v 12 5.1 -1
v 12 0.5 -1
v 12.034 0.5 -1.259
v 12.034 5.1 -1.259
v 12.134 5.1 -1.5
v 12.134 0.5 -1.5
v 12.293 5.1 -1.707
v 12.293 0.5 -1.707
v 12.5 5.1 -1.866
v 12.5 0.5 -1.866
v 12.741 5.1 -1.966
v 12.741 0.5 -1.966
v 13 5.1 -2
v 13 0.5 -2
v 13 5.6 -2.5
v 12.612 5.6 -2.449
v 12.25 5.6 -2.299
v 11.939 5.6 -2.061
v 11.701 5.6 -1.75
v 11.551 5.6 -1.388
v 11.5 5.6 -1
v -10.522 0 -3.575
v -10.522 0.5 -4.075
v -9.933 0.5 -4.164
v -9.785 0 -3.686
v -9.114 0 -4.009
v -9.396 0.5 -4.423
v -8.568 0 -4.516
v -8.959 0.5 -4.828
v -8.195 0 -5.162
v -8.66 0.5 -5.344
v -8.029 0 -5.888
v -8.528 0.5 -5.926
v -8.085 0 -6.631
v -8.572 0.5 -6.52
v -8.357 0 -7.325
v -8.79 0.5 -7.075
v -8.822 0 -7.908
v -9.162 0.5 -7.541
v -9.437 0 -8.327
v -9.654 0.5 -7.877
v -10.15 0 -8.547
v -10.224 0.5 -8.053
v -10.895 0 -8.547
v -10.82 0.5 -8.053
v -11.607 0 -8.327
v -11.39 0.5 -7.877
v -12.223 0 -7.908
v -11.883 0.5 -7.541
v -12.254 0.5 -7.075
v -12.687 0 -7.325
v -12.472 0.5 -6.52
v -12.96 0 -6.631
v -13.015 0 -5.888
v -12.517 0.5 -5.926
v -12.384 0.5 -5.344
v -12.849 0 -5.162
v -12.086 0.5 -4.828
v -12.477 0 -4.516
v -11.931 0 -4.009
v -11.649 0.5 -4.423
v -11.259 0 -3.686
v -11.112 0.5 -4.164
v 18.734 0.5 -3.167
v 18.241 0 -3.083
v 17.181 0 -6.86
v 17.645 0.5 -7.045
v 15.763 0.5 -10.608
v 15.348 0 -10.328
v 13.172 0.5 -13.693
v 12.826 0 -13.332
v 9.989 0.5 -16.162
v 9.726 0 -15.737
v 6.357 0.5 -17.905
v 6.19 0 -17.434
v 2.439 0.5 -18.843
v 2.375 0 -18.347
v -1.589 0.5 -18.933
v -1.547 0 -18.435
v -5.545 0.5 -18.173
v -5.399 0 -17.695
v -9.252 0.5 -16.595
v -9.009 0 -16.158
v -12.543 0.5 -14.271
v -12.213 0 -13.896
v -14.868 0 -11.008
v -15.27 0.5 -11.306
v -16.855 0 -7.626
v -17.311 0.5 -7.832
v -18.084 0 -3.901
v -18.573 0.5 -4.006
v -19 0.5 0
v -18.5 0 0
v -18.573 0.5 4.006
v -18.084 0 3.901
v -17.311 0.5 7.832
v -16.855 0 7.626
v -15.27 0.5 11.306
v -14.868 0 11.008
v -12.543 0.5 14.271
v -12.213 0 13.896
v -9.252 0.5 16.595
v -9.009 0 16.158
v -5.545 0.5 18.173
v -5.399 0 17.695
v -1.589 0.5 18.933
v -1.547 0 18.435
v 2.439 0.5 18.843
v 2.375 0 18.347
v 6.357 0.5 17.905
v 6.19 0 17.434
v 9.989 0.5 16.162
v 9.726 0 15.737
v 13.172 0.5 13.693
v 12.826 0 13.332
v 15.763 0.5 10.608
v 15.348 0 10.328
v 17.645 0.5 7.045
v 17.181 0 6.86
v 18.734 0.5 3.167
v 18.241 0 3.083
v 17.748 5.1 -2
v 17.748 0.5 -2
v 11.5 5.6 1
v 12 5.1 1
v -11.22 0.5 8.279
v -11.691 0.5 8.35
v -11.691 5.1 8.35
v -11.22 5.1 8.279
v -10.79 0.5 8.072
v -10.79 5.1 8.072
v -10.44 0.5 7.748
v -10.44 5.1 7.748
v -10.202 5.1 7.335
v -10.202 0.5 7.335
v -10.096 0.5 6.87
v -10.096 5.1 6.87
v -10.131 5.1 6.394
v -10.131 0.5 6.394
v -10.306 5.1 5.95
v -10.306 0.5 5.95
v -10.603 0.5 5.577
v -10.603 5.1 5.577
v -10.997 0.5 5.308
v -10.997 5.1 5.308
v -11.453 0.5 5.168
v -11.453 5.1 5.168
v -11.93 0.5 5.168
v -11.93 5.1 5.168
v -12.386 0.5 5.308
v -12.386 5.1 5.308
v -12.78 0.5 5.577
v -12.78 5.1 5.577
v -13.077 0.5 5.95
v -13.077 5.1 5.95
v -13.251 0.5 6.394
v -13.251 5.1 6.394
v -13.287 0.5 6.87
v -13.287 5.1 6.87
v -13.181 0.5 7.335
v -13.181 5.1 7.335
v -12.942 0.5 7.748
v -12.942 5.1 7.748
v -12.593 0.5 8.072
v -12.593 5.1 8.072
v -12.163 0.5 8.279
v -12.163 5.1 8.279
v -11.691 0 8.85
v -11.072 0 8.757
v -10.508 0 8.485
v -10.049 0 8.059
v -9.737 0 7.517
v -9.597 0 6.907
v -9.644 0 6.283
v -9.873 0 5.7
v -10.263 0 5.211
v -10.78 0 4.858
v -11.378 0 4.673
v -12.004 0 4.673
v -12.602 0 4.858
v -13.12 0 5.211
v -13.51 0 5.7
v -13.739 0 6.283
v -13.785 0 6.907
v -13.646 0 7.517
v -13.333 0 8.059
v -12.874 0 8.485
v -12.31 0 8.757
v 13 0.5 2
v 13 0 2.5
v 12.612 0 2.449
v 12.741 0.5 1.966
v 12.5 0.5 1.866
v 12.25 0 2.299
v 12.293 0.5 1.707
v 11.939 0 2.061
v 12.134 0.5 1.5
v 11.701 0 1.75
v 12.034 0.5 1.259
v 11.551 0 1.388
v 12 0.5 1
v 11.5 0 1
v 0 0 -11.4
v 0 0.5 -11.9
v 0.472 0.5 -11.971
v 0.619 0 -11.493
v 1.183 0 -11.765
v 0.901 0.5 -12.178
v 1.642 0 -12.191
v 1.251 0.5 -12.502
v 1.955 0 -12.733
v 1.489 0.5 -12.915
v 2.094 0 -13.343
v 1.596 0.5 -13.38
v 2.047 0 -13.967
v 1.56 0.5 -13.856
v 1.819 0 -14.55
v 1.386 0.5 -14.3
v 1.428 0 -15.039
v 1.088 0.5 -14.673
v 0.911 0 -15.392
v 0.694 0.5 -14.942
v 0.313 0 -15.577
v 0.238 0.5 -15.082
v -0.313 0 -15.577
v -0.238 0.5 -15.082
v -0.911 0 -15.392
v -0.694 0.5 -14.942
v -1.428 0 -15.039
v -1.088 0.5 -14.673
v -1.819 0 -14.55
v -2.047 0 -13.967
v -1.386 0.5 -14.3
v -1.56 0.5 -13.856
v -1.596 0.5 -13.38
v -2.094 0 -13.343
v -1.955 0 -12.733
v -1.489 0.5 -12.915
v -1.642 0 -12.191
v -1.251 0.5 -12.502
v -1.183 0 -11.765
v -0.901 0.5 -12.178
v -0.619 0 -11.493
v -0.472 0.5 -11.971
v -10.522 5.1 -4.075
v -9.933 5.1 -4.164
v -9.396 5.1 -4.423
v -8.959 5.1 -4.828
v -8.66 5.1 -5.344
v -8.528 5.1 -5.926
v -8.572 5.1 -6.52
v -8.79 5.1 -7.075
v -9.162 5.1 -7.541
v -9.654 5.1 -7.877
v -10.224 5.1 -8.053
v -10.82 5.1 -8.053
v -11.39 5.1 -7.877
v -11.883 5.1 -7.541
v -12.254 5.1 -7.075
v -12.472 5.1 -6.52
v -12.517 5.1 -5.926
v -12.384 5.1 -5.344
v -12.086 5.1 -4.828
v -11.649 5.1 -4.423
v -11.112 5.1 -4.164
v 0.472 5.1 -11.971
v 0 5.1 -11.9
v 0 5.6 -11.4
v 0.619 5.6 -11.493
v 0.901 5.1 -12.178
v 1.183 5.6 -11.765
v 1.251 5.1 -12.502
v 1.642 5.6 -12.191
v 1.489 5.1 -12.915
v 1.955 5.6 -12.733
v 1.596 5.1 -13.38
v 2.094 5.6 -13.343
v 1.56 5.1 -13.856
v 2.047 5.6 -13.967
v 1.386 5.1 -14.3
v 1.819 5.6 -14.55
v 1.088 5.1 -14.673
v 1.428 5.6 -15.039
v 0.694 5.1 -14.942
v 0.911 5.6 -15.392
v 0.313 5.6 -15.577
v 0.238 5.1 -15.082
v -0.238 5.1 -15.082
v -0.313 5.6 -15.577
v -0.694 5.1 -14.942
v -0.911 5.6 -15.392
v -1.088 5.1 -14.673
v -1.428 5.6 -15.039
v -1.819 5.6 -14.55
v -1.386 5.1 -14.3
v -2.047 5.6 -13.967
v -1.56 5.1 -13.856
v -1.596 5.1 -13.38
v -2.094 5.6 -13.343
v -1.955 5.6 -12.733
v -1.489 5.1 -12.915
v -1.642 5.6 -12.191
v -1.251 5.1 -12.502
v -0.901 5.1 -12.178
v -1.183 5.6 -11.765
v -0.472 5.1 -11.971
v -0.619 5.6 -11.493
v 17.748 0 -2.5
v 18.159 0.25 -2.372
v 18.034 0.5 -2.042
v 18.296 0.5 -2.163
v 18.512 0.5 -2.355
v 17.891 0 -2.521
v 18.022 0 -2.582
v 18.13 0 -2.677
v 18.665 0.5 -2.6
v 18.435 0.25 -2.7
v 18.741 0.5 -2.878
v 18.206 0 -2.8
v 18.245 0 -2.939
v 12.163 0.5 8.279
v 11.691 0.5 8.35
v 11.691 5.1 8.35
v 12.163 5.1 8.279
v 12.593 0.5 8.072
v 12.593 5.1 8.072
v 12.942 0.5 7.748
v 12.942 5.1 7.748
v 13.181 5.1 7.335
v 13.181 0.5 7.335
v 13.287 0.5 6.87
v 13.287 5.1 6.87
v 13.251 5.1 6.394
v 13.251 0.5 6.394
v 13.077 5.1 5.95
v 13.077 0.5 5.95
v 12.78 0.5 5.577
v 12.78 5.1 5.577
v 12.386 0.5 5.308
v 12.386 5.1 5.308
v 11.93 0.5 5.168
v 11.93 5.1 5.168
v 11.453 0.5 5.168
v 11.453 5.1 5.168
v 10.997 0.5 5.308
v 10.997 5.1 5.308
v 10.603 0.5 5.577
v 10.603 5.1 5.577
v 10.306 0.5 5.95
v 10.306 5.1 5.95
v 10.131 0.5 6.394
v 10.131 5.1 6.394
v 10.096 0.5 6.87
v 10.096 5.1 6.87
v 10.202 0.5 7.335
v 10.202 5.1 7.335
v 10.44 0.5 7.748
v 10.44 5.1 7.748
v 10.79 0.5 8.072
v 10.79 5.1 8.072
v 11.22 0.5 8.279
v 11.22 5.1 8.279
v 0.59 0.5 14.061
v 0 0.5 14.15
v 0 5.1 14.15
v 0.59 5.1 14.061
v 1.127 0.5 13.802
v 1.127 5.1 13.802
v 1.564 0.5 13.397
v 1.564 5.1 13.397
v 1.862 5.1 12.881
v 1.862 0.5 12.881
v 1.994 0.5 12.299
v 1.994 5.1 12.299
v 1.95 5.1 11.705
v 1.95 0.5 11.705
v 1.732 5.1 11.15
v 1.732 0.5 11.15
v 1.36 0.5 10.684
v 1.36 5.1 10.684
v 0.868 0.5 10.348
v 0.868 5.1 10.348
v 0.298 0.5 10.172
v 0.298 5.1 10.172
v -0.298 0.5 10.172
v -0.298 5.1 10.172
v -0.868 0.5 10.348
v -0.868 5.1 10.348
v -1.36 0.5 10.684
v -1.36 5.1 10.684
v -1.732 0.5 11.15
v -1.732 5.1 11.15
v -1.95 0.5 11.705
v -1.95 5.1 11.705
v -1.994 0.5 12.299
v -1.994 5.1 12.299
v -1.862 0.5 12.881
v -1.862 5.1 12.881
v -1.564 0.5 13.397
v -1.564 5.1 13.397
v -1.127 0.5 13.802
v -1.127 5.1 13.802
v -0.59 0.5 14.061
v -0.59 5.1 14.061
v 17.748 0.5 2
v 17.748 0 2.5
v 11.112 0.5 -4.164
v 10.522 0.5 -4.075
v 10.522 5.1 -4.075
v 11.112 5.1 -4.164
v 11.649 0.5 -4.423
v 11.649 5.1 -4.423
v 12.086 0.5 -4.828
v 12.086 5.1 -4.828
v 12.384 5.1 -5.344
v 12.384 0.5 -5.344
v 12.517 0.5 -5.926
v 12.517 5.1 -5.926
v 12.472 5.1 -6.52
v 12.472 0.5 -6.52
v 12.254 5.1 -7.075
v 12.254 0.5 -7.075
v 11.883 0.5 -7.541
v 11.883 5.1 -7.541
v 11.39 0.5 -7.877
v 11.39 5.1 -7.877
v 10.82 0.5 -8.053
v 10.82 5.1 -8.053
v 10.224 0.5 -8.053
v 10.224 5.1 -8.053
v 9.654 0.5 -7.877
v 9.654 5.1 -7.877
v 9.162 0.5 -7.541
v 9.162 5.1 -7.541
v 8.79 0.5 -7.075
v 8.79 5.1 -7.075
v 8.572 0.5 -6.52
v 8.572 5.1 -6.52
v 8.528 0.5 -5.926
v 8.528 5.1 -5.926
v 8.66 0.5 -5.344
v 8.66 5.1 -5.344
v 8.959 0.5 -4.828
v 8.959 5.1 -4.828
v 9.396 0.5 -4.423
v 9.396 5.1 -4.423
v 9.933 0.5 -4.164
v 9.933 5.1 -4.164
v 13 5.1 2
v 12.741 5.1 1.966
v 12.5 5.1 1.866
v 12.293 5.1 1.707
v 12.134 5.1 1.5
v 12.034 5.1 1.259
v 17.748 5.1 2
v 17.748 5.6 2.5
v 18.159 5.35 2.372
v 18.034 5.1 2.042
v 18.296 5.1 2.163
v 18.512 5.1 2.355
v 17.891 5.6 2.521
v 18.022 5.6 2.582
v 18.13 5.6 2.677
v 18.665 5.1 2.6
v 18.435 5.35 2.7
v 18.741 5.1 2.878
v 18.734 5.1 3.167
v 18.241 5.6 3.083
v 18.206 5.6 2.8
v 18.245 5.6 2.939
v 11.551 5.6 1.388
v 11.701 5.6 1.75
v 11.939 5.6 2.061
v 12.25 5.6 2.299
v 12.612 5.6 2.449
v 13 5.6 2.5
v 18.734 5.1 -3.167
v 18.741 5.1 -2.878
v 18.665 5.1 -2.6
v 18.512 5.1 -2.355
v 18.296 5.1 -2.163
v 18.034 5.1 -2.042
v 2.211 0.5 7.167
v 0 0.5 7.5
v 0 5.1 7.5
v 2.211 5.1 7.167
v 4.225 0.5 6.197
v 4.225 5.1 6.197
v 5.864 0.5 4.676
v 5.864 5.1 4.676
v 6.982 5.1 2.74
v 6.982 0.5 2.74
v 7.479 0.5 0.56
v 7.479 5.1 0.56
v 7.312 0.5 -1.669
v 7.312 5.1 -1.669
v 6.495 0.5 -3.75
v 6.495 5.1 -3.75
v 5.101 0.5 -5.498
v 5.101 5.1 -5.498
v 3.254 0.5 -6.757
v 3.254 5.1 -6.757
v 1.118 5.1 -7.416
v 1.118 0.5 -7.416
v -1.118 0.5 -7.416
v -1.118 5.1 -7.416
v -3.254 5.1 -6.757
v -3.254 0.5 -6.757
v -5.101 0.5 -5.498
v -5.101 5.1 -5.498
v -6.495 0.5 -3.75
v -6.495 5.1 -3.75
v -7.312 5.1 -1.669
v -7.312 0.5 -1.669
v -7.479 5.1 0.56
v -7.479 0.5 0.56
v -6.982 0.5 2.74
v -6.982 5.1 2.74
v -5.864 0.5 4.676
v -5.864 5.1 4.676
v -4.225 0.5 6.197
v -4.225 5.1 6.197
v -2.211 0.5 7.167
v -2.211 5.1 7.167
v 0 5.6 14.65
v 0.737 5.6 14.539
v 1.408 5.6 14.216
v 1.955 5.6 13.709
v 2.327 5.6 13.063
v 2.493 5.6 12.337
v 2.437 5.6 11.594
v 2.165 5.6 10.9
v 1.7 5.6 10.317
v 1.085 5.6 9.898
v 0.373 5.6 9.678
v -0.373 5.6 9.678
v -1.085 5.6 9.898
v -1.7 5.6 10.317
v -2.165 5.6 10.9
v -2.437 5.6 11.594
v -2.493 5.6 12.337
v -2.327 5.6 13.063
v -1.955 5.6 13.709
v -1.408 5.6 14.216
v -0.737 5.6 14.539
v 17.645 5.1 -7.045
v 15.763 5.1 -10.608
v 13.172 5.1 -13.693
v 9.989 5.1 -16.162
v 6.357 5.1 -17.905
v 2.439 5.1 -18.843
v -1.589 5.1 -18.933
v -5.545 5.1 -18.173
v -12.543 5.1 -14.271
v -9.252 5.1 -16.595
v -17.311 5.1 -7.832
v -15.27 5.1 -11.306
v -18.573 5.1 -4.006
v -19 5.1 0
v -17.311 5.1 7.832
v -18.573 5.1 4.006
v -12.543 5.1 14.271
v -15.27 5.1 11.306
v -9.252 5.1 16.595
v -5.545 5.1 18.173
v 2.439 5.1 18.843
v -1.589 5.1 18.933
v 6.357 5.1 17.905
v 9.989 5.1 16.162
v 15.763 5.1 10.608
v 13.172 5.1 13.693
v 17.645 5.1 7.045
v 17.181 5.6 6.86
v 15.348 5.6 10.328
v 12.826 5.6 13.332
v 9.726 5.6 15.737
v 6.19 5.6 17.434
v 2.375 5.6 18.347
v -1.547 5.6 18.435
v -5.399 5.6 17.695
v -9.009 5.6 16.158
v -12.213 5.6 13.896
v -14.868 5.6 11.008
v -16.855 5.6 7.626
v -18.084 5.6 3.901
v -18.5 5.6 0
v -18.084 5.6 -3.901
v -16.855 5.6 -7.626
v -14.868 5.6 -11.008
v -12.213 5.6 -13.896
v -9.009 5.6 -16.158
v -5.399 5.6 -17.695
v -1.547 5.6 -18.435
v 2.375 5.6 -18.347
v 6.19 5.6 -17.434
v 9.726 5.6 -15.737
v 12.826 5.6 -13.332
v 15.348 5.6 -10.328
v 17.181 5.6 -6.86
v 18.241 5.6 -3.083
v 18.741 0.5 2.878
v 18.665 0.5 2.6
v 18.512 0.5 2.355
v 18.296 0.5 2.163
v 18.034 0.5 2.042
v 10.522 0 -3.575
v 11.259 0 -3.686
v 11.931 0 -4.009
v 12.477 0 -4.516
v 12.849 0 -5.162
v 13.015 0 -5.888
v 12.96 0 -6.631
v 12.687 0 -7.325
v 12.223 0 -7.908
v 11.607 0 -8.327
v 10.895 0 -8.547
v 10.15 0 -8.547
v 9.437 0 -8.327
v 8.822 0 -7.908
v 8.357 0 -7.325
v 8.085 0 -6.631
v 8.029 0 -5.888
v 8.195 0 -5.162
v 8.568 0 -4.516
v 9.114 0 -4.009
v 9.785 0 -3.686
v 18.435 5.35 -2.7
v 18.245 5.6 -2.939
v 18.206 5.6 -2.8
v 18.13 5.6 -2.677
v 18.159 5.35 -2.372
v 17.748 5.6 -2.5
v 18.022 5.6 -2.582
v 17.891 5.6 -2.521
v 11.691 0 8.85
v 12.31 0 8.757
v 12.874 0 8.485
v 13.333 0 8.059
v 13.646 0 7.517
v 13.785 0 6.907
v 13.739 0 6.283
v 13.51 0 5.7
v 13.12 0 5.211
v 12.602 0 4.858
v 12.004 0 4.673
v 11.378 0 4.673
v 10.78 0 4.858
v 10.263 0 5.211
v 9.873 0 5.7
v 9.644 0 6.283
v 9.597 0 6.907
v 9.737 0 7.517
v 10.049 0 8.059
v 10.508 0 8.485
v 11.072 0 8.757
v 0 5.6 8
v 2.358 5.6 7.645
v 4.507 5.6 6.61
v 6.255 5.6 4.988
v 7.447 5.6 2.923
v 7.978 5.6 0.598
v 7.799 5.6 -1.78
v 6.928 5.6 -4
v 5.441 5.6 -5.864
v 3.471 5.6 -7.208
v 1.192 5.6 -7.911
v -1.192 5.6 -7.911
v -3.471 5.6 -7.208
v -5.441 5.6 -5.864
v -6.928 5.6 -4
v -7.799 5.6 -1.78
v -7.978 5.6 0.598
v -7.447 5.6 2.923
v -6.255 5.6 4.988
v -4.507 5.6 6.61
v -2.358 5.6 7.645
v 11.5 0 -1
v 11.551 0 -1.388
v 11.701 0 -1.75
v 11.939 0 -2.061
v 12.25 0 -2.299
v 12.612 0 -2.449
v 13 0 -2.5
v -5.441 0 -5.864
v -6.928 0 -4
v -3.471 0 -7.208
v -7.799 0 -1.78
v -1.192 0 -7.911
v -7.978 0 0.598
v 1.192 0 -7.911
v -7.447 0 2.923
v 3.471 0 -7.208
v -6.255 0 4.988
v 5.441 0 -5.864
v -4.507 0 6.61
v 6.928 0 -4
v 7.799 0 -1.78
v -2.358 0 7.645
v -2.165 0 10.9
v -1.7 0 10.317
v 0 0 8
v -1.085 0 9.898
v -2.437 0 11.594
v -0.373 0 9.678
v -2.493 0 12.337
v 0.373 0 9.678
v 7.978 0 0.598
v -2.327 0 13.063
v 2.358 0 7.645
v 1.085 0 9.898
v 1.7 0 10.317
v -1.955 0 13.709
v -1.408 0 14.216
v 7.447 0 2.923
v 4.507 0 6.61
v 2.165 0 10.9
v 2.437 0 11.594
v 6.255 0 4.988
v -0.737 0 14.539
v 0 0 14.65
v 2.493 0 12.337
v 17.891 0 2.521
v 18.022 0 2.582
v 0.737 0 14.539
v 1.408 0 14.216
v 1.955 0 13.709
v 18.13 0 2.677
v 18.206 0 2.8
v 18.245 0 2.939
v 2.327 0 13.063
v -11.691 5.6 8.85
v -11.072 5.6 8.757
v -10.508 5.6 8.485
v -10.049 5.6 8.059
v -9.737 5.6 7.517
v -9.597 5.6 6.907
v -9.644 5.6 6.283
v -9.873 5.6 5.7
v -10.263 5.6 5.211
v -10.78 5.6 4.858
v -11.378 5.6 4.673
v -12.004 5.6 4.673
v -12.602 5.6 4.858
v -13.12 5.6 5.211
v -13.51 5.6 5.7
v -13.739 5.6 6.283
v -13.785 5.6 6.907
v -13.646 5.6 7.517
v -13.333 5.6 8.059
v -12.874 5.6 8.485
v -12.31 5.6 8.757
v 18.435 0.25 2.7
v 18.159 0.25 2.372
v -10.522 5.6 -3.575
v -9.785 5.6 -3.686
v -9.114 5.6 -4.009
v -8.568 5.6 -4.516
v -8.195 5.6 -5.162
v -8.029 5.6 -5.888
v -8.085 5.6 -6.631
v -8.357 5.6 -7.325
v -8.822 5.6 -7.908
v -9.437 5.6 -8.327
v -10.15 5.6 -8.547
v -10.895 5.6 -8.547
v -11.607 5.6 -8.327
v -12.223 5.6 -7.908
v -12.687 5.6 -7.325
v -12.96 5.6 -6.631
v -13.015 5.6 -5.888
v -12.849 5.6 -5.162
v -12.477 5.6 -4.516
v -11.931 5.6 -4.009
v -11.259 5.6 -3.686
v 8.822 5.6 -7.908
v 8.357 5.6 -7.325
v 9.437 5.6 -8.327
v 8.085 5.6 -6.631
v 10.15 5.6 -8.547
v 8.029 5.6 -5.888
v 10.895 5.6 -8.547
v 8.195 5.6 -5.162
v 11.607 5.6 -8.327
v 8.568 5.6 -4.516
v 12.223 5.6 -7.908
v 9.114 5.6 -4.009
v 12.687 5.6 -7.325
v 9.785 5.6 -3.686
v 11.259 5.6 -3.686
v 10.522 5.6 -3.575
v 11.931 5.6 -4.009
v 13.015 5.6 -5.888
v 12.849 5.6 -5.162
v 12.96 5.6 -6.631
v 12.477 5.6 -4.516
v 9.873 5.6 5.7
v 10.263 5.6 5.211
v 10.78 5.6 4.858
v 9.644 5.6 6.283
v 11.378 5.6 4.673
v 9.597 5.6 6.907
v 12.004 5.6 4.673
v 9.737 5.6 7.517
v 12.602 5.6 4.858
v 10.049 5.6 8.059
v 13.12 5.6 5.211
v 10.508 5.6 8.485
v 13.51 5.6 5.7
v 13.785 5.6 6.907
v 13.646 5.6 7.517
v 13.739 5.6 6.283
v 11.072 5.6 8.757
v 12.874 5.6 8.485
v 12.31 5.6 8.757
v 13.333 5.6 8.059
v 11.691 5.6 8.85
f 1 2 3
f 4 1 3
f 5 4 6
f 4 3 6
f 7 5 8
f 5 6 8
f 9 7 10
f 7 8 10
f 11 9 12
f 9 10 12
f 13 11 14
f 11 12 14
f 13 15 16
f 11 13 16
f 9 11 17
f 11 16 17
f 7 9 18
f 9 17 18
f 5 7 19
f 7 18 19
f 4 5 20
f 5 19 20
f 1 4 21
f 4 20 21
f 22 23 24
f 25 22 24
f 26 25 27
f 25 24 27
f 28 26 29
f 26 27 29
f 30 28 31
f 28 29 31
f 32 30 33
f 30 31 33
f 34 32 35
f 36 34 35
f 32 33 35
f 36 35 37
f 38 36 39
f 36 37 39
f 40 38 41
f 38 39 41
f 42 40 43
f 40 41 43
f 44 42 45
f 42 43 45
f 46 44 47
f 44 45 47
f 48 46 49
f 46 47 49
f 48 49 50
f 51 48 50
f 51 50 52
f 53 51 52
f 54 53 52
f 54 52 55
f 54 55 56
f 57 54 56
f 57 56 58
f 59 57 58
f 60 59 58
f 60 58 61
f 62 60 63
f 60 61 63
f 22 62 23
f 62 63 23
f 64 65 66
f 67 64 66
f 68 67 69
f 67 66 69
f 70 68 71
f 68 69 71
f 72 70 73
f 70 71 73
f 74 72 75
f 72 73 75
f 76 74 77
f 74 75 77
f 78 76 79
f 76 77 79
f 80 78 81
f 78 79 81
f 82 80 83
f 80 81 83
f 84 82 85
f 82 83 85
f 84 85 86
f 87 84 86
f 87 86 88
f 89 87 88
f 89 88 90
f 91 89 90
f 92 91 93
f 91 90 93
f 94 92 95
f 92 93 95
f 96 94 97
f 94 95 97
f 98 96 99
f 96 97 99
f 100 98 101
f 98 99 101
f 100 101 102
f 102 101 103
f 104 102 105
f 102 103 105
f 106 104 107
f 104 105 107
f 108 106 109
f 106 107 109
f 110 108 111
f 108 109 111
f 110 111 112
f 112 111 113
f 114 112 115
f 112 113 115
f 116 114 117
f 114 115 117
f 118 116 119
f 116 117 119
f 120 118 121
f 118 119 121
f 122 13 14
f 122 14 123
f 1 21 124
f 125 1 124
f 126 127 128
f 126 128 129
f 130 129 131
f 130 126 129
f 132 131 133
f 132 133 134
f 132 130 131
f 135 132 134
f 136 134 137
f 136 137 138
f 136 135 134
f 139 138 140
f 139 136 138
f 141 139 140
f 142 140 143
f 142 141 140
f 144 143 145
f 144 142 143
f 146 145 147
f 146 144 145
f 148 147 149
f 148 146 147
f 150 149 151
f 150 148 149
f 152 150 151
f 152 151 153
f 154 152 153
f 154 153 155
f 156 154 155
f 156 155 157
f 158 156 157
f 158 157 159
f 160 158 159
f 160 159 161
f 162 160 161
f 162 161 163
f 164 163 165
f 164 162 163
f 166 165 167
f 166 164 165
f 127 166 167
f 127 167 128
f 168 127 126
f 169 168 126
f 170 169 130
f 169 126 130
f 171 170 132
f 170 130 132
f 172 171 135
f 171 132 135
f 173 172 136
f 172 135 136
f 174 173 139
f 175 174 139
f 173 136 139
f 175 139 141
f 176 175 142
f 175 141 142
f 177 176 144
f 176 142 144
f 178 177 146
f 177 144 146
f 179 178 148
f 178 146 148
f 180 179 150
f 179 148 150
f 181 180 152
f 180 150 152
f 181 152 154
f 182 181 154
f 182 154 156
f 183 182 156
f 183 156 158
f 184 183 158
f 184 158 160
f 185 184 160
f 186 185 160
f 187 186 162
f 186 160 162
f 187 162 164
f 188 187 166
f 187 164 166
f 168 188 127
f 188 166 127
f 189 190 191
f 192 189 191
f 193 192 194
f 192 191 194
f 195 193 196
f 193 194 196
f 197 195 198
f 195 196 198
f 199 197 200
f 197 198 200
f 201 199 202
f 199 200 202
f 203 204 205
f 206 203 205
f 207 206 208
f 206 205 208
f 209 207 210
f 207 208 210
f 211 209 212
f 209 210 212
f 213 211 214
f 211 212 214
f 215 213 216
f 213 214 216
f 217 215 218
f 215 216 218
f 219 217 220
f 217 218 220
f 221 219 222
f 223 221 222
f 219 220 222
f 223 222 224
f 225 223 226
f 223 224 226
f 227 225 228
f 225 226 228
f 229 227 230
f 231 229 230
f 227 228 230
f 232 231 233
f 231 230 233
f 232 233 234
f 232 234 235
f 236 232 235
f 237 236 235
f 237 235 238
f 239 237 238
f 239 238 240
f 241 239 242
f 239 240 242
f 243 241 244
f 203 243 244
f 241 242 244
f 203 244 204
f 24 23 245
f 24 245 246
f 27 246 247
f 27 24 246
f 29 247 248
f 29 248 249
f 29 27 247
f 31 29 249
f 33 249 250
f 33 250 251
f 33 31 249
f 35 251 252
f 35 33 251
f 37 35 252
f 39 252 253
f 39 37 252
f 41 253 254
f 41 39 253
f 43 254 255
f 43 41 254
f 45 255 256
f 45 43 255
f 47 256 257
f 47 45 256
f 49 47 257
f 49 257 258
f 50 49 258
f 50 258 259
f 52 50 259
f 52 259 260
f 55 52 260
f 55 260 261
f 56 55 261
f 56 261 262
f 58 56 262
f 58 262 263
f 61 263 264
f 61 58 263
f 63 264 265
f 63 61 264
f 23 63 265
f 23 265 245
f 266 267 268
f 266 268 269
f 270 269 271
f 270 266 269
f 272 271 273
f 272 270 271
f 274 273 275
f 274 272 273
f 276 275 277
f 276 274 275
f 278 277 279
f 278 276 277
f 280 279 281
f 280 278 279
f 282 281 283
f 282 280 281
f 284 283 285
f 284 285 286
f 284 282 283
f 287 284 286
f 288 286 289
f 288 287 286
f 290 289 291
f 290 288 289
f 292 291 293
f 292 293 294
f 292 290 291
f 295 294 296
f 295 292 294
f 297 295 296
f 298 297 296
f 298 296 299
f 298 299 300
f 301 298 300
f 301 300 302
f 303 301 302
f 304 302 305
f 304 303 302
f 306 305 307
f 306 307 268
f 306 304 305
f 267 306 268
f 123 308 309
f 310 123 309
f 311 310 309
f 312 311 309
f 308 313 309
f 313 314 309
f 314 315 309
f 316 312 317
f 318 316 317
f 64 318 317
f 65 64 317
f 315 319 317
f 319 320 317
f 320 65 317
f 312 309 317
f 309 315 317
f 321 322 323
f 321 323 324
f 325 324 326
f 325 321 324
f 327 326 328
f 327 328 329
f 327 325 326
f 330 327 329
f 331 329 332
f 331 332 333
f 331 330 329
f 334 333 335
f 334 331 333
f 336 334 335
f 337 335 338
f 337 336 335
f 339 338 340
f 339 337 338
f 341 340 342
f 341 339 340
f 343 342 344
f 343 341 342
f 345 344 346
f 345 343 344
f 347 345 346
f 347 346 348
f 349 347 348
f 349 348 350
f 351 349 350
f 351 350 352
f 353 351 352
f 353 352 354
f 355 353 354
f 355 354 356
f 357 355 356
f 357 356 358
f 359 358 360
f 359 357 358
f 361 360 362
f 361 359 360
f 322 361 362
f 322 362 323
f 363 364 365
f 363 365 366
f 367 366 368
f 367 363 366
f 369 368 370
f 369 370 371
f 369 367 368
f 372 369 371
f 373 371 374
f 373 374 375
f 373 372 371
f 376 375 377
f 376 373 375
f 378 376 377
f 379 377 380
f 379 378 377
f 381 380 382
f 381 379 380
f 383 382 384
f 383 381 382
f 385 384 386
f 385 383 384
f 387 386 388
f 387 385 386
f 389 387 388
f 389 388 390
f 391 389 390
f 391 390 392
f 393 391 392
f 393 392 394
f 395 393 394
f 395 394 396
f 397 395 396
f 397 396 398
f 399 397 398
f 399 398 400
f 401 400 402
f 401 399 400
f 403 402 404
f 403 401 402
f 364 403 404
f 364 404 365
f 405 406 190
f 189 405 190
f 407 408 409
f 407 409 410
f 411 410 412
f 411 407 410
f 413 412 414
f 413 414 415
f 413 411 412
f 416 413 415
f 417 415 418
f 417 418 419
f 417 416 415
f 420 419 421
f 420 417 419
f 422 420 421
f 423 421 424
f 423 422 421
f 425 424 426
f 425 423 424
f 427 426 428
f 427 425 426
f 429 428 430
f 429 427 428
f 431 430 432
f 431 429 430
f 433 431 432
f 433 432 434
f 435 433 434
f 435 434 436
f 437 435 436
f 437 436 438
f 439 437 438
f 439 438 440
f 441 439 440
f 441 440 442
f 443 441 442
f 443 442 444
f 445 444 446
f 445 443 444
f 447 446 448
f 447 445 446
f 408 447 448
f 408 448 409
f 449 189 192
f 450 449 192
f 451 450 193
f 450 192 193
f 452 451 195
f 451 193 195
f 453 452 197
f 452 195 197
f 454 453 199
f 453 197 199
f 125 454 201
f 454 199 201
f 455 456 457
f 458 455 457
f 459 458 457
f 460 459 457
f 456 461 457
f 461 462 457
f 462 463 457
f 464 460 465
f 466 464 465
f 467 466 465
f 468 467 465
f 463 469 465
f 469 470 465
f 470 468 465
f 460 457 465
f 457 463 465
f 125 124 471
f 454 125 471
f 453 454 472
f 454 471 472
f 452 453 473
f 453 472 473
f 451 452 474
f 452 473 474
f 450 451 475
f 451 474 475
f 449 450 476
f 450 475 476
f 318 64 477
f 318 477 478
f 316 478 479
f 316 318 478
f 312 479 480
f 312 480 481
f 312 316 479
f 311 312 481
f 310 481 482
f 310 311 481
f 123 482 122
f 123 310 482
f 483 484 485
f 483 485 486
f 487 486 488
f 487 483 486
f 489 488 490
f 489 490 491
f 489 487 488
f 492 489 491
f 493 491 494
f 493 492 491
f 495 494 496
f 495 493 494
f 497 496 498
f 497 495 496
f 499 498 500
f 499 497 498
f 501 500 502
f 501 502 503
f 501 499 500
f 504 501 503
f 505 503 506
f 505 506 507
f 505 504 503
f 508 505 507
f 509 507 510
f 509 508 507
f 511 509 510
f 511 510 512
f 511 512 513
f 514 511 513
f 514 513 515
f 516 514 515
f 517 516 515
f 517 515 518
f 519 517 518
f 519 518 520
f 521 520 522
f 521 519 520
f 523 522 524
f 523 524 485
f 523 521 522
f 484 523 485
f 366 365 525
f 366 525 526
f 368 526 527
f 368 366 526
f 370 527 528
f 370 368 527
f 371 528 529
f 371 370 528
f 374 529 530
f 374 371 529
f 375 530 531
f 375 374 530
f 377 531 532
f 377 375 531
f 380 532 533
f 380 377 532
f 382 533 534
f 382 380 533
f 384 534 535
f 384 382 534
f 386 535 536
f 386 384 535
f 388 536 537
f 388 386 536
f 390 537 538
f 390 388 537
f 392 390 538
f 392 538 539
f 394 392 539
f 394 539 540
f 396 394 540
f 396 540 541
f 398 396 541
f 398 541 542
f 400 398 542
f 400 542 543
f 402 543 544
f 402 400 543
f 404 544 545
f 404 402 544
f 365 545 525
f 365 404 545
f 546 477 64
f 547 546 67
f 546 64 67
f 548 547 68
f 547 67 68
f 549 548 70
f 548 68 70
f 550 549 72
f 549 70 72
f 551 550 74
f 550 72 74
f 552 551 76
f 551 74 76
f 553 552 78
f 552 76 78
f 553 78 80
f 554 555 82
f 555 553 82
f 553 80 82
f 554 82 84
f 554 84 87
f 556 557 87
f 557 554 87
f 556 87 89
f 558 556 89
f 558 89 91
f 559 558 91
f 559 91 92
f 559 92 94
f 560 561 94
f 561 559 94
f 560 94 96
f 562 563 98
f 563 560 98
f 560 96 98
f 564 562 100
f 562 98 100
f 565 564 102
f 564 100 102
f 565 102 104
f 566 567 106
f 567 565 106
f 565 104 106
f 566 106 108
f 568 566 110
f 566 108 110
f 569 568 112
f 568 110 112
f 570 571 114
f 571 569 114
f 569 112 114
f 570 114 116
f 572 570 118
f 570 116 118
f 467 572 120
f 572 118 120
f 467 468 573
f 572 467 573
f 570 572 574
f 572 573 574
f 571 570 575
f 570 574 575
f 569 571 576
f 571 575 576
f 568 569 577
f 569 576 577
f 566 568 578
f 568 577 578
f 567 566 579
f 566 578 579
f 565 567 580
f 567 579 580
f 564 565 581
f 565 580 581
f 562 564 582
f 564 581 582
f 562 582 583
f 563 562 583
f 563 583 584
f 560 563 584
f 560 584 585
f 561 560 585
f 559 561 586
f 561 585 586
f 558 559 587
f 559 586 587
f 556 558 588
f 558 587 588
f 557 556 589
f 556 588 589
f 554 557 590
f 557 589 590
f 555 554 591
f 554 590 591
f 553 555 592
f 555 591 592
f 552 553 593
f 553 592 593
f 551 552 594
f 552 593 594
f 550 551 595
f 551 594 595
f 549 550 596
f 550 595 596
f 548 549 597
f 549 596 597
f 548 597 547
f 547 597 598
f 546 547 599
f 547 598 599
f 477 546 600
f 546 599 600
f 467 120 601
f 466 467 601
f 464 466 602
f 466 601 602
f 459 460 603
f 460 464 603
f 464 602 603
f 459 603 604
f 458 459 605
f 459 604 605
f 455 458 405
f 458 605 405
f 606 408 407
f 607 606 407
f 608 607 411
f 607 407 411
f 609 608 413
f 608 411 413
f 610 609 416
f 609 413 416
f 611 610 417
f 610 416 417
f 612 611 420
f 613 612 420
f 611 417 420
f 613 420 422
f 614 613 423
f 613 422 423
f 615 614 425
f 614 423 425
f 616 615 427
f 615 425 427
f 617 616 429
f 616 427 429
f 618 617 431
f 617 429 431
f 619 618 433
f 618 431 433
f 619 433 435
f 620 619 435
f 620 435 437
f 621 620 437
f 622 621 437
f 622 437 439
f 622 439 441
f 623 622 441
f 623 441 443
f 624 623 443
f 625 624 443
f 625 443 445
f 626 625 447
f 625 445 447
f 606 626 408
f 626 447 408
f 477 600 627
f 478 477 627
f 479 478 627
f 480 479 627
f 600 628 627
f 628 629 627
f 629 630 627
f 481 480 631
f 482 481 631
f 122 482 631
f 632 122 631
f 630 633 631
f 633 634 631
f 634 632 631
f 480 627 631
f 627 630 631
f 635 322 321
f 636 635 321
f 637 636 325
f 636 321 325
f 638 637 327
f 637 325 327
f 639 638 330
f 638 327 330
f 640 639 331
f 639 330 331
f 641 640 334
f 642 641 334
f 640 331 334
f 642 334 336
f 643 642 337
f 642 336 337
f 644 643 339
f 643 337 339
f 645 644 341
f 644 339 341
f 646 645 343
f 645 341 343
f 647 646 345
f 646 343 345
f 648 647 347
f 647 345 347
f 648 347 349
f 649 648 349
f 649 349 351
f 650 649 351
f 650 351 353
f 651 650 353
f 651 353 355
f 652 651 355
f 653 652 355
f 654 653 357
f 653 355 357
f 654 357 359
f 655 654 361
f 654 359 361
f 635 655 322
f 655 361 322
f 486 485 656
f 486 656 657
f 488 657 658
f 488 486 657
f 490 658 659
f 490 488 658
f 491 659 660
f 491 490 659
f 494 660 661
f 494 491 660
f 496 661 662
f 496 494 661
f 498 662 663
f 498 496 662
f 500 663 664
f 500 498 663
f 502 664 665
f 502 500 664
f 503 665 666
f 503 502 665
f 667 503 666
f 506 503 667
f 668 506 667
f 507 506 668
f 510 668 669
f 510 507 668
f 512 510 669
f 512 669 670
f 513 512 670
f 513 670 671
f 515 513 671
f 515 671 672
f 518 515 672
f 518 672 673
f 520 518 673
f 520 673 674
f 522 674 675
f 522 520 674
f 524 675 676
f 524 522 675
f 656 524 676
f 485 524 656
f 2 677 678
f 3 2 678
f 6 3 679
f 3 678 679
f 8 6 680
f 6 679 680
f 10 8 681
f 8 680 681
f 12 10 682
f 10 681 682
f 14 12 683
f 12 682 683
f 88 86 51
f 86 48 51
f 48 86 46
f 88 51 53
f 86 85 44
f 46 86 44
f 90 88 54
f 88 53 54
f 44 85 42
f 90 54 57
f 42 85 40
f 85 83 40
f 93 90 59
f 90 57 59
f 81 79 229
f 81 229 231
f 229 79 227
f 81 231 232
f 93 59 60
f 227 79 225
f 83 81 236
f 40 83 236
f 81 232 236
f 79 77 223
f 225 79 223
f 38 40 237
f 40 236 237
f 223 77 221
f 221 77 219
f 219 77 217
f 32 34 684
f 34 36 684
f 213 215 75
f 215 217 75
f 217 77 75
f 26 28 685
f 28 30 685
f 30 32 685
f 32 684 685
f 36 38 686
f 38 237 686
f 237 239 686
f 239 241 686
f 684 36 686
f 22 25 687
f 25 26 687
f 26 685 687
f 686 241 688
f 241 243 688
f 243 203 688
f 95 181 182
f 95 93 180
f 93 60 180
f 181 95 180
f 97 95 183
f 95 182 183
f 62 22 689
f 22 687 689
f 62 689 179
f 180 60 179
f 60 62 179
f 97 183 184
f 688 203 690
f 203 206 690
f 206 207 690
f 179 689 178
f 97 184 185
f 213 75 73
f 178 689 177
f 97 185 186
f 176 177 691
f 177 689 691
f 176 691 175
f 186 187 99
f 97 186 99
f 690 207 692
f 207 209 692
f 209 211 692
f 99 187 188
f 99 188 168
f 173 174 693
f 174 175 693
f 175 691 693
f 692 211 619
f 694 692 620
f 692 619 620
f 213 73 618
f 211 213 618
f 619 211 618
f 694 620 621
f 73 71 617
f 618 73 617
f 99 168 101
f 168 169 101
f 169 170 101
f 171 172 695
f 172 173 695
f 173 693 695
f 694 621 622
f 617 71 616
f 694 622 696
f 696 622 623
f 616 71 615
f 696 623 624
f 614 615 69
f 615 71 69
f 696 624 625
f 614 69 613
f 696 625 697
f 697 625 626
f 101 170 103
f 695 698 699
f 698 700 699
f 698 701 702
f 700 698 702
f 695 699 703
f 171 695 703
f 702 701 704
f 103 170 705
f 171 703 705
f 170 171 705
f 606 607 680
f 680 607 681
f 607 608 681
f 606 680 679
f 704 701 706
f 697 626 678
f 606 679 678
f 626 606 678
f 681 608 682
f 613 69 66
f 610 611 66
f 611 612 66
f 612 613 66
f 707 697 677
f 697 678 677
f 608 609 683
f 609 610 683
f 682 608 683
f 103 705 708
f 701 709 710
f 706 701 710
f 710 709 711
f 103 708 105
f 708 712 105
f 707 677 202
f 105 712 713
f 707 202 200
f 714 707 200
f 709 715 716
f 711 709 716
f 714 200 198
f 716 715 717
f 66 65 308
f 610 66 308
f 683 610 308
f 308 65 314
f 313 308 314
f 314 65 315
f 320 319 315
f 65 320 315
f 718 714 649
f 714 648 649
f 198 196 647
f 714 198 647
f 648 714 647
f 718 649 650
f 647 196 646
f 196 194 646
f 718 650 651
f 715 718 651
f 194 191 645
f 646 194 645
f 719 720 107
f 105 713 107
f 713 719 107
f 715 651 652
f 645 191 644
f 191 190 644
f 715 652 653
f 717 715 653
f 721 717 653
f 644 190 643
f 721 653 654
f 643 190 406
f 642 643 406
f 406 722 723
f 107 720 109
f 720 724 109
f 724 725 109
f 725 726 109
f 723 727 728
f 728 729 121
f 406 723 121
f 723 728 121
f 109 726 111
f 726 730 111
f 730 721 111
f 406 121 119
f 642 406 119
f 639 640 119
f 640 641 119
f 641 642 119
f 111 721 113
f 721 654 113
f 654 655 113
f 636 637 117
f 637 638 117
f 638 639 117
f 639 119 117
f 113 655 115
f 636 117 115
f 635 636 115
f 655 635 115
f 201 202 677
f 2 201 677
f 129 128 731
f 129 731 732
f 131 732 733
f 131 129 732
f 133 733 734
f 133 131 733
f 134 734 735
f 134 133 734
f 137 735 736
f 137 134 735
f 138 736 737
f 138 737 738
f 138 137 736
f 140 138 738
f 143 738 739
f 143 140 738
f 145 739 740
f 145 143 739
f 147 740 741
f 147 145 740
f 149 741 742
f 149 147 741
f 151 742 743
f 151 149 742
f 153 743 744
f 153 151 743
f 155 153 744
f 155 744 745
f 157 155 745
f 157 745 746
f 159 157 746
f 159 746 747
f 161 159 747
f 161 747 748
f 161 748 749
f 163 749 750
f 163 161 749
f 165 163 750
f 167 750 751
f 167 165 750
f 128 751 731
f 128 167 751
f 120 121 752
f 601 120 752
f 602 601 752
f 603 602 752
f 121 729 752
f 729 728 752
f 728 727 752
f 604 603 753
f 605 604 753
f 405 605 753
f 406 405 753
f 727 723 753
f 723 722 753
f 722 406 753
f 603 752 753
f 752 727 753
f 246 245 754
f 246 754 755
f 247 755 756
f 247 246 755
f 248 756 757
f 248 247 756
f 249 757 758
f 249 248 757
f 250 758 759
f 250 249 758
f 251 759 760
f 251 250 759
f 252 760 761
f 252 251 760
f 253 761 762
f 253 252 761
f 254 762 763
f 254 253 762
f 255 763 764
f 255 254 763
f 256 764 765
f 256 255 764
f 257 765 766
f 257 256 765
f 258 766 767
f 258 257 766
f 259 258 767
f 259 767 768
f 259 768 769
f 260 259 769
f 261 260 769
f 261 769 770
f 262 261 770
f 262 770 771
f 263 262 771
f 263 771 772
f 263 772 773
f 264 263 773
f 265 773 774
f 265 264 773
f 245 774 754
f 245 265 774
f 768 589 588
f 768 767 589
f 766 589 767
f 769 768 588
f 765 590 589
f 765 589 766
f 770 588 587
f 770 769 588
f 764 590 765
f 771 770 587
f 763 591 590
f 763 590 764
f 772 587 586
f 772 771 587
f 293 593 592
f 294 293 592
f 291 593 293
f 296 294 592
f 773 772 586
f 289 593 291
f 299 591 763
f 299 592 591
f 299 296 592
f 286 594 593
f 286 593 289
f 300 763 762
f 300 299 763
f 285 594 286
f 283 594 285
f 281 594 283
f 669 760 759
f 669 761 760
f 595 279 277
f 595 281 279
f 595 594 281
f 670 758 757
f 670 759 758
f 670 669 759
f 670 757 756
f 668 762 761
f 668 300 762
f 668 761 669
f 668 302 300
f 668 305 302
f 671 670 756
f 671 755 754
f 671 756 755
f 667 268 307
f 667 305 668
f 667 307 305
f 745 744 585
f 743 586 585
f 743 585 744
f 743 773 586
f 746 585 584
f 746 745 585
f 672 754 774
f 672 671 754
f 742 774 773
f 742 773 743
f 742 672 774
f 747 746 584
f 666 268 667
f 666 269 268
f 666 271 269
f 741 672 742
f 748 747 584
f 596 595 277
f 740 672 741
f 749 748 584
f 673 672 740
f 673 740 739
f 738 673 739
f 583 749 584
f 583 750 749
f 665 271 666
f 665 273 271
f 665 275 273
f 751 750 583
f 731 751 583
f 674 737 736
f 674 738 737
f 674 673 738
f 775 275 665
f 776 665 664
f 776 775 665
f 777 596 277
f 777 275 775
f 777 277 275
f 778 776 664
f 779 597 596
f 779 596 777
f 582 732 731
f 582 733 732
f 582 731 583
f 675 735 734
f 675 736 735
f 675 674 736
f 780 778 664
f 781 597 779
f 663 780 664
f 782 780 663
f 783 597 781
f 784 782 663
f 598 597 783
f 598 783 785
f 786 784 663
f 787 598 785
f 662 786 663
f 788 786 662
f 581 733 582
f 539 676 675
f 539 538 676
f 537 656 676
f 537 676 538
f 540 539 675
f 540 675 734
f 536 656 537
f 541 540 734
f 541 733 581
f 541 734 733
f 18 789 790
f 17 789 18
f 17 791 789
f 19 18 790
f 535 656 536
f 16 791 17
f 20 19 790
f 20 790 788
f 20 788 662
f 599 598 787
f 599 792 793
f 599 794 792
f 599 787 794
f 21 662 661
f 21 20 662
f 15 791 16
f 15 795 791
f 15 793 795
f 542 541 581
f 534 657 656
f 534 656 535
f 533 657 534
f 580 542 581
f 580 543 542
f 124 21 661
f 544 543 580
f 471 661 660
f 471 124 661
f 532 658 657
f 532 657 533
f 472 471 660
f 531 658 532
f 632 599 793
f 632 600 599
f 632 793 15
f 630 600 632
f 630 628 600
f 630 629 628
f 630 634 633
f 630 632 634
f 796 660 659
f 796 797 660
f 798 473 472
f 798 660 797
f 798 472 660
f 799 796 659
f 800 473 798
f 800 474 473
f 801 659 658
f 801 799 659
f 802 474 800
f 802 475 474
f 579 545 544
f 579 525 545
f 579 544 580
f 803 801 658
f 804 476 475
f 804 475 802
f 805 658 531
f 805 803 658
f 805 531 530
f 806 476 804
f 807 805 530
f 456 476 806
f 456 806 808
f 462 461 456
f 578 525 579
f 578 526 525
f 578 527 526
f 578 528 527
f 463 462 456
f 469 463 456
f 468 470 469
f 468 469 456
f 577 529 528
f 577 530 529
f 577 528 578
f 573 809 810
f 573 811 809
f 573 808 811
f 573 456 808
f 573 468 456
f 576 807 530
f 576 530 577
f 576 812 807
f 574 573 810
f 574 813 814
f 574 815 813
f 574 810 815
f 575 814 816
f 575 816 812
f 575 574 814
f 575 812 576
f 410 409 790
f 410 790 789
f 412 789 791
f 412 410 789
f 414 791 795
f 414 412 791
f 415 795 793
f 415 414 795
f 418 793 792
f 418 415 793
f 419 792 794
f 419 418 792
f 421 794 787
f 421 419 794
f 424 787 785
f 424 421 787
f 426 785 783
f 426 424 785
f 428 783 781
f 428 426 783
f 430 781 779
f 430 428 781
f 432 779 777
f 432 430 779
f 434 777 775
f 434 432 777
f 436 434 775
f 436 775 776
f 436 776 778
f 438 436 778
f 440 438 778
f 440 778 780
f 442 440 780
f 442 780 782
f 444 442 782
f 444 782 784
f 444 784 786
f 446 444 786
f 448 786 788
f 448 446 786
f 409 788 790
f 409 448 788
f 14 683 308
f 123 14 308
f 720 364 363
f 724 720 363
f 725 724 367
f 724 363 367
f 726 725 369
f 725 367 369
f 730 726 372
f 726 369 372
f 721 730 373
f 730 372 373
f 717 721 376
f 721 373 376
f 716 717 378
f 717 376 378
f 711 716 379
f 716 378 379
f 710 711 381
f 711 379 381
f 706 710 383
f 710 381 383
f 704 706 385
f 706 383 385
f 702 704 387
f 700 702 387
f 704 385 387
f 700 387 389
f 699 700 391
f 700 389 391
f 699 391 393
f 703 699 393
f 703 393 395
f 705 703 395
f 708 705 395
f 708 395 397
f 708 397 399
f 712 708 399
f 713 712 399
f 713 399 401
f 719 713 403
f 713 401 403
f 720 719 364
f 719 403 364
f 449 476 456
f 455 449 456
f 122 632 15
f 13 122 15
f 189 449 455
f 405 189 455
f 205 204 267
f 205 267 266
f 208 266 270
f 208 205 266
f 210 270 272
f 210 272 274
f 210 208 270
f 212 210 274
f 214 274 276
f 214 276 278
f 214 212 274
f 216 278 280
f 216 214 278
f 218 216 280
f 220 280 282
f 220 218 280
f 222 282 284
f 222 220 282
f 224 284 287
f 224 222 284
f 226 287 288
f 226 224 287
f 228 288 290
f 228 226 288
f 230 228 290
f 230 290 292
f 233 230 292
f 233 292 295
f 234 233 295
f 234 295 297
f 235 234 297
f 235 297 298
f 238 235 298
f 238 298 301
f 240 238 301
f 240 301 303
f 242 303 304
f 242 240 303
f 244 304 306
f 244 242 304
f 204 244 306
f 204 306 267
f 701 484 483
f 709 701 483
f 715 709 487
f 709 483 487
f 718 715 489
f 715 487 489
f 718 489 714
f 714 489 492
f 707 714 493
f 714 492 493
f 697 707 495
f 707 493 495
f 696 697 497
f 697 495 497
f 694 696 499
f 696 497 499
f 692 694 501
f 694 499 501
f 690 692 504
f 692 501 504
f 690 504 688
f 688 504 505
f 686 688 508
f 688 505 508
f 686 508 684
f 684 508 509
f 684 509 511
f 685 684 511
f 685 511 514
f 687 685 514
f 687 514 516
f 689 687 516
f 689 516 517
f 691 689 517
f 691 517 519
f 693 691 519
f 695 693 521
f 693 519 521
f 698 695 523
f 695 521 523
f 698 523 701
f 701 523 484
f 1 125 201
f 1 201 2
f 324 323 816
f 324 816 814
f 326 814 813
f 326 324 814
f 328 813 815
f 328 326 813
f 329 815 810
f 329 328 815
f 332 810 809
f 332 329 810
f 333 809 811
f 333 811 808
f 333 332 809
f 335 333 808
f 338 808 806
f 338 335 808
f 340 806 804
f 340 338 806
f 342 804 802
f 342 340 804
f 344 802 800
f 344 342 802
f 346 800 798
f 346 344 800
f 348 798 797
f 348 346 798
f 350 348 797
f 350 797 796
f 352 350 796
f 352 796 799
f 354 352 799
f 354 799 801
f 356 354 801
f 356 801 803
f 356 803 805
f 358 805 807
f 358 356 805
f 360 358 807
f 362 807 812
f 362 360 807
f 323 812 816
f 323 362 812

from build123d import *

# Parameters (mm, degrees)
SKETCH_1_R          = 19
SKETCH_1_R_2        = 2
SKETCH_1_R_3        = 7.5
SKETCH_1_R_4        = 1.6
EXTRUDE_1_DEPTH     = 5.6
SKETCH_2_W          = 15.17824661
SKETCH_2_H          = 4
CUT_EXTRUDE_1_DEPTH = 10
FILLET_1_R          = 1
CHAMFER_1_SIZE      = 0.5
CHAMFER_2_SIZE      = 0.5


with BuildPart() as part:
    # 草图1 → 凸台-拉伸1 (new body)
    with BuildSketch(Plane(origin=(0, 0, 0), x_dir=(1, 0, 0), z_dir=(0, 1, 0))):
        with Locations(Location((0, 0, 0), (0, 0, 270))):
            Circle(SKETCH_1_R)
        with Locations(Location((0, -12.15, 0), (0, 0, 270))):
            Circle(SKETCH_1_R_2, mode=Mode.SUBTRACT)
        with Locations(Location((10.522208656, 6.075, 0), (0, 0, 270))):
            Circle(SKETCH_1_R_2, mode=Mode.SUBTRACT)
        with Locations(Location((-10.522208656, 6.075, 0), (0, 0, 270))):
            Circle(SKETCH_1_R_2, mode=Mode.SUBTRACT)
        with Locations(Location((0, 0, 0), (0, 0, 270))):
            Circle(SKETCH_1_R_3, mode=Mode.SUBTRACT)
        with Locations(Location((-11.691342951, -6.75, 0), (0, 0, 270))):
            Circle(SKETCH_1_R_4, mode=Mode.SUBTRACT)
        with Locations(Location((11.691342951, -6.75, 0), (0, 0, 270))):
            Circle(SKETCH_1_R_4, mode=Mode.SUBTRACT)
        with Locations(Location((0, 13.5, 0), (0, 0, 270))):
            Circle(SKETCH_1_R_4, mode=Mode.SUBTRACT)
    extrude(amount=EXTRUDE_1_DEPTH)

    # 草图2 → 切除-拉伸1 (cut)
    with BuildSketch(Plane(origin=(0, 5.6, 0), x_dir=(1, 0, 0), z_dir=(0, 1, 0))):
        with Locations((19.589123305, 0)):
            Rectangle(SKETCH_2_W, SKETCH_2_H)
    extrude(amount=-CUT_EXTRUDE_1_DEPTH, mode=Mode.SUBTRACT)

    # 圆角1
    fillet_1_edges = [part.edges().sort_by_distance(p)[0] for p in [
        (12, 2.8, 2),
        (18.894443628, 2.8, -2),
        (12, 2.8, -2),
        (18.894443628, 2.8, 2),
    ]]
    fillet(fillet_1_edges, radius=FILLET_1_R)

    # 倒角1
    chamfer_1_edges = [part.edges().sort_by_distance(p)[0] for p in [
        (-19, 5.6, 0),
        (-19, 0, 0),
        (15.374119675, 5.6, -2),
        (15.374119675, 5.6, 2),
        (12, 5.6, 0),
        (18.512001965, 5.6, -2.354502776),
        (18.512001965, 5.6, 2.354502776),
        (15.374119675, 0, 2),
        (15.374119675, 0, -2),
        (12, 0, 0),
        (18.512001965, 0, -2.354502776),
        (18.512001965, 0, 2.354502776),
        (12.292893219, 5.6, 1.707106781),
        (12.292893219, 0, 1.707106781),
        (12.292893219, 5.6, -1.707106781),
        (12.292893219, 0, -1.707106781),
    ]]
    chamfer(chamfer_1_edges, length=CHAMFER_1_SIZE)

    # 倒角2
    chamfer_2_edges = [part.edges().sort_by_distance(p)[0] for p in [
        (0, 5.6, 10.15),
        (0, 0, -15.1),
        (11.691342951, 0, 5.15),
        (-11.691342951, 0, 5.15),
        (0, 0, -7.5),
        (-10.522208656, 0, -8.075),
        (10.522208656, 0, -8.075),
        (0, 0, 10.15),
        (10.522208656, 5.6, -8.075),
        (-10.522208656, 5.6, -8.075),
        (0, 5.6, -7.5),
        (-11.691342951, 5.6, 5.15),
        (11.691342951, 5.6, 5.15),
        (0, 5.6, -15.1),
    ]]
    chamfer(chamfer_2_edges, length=CHAMFER_2_SIZE)


solid = part.part
